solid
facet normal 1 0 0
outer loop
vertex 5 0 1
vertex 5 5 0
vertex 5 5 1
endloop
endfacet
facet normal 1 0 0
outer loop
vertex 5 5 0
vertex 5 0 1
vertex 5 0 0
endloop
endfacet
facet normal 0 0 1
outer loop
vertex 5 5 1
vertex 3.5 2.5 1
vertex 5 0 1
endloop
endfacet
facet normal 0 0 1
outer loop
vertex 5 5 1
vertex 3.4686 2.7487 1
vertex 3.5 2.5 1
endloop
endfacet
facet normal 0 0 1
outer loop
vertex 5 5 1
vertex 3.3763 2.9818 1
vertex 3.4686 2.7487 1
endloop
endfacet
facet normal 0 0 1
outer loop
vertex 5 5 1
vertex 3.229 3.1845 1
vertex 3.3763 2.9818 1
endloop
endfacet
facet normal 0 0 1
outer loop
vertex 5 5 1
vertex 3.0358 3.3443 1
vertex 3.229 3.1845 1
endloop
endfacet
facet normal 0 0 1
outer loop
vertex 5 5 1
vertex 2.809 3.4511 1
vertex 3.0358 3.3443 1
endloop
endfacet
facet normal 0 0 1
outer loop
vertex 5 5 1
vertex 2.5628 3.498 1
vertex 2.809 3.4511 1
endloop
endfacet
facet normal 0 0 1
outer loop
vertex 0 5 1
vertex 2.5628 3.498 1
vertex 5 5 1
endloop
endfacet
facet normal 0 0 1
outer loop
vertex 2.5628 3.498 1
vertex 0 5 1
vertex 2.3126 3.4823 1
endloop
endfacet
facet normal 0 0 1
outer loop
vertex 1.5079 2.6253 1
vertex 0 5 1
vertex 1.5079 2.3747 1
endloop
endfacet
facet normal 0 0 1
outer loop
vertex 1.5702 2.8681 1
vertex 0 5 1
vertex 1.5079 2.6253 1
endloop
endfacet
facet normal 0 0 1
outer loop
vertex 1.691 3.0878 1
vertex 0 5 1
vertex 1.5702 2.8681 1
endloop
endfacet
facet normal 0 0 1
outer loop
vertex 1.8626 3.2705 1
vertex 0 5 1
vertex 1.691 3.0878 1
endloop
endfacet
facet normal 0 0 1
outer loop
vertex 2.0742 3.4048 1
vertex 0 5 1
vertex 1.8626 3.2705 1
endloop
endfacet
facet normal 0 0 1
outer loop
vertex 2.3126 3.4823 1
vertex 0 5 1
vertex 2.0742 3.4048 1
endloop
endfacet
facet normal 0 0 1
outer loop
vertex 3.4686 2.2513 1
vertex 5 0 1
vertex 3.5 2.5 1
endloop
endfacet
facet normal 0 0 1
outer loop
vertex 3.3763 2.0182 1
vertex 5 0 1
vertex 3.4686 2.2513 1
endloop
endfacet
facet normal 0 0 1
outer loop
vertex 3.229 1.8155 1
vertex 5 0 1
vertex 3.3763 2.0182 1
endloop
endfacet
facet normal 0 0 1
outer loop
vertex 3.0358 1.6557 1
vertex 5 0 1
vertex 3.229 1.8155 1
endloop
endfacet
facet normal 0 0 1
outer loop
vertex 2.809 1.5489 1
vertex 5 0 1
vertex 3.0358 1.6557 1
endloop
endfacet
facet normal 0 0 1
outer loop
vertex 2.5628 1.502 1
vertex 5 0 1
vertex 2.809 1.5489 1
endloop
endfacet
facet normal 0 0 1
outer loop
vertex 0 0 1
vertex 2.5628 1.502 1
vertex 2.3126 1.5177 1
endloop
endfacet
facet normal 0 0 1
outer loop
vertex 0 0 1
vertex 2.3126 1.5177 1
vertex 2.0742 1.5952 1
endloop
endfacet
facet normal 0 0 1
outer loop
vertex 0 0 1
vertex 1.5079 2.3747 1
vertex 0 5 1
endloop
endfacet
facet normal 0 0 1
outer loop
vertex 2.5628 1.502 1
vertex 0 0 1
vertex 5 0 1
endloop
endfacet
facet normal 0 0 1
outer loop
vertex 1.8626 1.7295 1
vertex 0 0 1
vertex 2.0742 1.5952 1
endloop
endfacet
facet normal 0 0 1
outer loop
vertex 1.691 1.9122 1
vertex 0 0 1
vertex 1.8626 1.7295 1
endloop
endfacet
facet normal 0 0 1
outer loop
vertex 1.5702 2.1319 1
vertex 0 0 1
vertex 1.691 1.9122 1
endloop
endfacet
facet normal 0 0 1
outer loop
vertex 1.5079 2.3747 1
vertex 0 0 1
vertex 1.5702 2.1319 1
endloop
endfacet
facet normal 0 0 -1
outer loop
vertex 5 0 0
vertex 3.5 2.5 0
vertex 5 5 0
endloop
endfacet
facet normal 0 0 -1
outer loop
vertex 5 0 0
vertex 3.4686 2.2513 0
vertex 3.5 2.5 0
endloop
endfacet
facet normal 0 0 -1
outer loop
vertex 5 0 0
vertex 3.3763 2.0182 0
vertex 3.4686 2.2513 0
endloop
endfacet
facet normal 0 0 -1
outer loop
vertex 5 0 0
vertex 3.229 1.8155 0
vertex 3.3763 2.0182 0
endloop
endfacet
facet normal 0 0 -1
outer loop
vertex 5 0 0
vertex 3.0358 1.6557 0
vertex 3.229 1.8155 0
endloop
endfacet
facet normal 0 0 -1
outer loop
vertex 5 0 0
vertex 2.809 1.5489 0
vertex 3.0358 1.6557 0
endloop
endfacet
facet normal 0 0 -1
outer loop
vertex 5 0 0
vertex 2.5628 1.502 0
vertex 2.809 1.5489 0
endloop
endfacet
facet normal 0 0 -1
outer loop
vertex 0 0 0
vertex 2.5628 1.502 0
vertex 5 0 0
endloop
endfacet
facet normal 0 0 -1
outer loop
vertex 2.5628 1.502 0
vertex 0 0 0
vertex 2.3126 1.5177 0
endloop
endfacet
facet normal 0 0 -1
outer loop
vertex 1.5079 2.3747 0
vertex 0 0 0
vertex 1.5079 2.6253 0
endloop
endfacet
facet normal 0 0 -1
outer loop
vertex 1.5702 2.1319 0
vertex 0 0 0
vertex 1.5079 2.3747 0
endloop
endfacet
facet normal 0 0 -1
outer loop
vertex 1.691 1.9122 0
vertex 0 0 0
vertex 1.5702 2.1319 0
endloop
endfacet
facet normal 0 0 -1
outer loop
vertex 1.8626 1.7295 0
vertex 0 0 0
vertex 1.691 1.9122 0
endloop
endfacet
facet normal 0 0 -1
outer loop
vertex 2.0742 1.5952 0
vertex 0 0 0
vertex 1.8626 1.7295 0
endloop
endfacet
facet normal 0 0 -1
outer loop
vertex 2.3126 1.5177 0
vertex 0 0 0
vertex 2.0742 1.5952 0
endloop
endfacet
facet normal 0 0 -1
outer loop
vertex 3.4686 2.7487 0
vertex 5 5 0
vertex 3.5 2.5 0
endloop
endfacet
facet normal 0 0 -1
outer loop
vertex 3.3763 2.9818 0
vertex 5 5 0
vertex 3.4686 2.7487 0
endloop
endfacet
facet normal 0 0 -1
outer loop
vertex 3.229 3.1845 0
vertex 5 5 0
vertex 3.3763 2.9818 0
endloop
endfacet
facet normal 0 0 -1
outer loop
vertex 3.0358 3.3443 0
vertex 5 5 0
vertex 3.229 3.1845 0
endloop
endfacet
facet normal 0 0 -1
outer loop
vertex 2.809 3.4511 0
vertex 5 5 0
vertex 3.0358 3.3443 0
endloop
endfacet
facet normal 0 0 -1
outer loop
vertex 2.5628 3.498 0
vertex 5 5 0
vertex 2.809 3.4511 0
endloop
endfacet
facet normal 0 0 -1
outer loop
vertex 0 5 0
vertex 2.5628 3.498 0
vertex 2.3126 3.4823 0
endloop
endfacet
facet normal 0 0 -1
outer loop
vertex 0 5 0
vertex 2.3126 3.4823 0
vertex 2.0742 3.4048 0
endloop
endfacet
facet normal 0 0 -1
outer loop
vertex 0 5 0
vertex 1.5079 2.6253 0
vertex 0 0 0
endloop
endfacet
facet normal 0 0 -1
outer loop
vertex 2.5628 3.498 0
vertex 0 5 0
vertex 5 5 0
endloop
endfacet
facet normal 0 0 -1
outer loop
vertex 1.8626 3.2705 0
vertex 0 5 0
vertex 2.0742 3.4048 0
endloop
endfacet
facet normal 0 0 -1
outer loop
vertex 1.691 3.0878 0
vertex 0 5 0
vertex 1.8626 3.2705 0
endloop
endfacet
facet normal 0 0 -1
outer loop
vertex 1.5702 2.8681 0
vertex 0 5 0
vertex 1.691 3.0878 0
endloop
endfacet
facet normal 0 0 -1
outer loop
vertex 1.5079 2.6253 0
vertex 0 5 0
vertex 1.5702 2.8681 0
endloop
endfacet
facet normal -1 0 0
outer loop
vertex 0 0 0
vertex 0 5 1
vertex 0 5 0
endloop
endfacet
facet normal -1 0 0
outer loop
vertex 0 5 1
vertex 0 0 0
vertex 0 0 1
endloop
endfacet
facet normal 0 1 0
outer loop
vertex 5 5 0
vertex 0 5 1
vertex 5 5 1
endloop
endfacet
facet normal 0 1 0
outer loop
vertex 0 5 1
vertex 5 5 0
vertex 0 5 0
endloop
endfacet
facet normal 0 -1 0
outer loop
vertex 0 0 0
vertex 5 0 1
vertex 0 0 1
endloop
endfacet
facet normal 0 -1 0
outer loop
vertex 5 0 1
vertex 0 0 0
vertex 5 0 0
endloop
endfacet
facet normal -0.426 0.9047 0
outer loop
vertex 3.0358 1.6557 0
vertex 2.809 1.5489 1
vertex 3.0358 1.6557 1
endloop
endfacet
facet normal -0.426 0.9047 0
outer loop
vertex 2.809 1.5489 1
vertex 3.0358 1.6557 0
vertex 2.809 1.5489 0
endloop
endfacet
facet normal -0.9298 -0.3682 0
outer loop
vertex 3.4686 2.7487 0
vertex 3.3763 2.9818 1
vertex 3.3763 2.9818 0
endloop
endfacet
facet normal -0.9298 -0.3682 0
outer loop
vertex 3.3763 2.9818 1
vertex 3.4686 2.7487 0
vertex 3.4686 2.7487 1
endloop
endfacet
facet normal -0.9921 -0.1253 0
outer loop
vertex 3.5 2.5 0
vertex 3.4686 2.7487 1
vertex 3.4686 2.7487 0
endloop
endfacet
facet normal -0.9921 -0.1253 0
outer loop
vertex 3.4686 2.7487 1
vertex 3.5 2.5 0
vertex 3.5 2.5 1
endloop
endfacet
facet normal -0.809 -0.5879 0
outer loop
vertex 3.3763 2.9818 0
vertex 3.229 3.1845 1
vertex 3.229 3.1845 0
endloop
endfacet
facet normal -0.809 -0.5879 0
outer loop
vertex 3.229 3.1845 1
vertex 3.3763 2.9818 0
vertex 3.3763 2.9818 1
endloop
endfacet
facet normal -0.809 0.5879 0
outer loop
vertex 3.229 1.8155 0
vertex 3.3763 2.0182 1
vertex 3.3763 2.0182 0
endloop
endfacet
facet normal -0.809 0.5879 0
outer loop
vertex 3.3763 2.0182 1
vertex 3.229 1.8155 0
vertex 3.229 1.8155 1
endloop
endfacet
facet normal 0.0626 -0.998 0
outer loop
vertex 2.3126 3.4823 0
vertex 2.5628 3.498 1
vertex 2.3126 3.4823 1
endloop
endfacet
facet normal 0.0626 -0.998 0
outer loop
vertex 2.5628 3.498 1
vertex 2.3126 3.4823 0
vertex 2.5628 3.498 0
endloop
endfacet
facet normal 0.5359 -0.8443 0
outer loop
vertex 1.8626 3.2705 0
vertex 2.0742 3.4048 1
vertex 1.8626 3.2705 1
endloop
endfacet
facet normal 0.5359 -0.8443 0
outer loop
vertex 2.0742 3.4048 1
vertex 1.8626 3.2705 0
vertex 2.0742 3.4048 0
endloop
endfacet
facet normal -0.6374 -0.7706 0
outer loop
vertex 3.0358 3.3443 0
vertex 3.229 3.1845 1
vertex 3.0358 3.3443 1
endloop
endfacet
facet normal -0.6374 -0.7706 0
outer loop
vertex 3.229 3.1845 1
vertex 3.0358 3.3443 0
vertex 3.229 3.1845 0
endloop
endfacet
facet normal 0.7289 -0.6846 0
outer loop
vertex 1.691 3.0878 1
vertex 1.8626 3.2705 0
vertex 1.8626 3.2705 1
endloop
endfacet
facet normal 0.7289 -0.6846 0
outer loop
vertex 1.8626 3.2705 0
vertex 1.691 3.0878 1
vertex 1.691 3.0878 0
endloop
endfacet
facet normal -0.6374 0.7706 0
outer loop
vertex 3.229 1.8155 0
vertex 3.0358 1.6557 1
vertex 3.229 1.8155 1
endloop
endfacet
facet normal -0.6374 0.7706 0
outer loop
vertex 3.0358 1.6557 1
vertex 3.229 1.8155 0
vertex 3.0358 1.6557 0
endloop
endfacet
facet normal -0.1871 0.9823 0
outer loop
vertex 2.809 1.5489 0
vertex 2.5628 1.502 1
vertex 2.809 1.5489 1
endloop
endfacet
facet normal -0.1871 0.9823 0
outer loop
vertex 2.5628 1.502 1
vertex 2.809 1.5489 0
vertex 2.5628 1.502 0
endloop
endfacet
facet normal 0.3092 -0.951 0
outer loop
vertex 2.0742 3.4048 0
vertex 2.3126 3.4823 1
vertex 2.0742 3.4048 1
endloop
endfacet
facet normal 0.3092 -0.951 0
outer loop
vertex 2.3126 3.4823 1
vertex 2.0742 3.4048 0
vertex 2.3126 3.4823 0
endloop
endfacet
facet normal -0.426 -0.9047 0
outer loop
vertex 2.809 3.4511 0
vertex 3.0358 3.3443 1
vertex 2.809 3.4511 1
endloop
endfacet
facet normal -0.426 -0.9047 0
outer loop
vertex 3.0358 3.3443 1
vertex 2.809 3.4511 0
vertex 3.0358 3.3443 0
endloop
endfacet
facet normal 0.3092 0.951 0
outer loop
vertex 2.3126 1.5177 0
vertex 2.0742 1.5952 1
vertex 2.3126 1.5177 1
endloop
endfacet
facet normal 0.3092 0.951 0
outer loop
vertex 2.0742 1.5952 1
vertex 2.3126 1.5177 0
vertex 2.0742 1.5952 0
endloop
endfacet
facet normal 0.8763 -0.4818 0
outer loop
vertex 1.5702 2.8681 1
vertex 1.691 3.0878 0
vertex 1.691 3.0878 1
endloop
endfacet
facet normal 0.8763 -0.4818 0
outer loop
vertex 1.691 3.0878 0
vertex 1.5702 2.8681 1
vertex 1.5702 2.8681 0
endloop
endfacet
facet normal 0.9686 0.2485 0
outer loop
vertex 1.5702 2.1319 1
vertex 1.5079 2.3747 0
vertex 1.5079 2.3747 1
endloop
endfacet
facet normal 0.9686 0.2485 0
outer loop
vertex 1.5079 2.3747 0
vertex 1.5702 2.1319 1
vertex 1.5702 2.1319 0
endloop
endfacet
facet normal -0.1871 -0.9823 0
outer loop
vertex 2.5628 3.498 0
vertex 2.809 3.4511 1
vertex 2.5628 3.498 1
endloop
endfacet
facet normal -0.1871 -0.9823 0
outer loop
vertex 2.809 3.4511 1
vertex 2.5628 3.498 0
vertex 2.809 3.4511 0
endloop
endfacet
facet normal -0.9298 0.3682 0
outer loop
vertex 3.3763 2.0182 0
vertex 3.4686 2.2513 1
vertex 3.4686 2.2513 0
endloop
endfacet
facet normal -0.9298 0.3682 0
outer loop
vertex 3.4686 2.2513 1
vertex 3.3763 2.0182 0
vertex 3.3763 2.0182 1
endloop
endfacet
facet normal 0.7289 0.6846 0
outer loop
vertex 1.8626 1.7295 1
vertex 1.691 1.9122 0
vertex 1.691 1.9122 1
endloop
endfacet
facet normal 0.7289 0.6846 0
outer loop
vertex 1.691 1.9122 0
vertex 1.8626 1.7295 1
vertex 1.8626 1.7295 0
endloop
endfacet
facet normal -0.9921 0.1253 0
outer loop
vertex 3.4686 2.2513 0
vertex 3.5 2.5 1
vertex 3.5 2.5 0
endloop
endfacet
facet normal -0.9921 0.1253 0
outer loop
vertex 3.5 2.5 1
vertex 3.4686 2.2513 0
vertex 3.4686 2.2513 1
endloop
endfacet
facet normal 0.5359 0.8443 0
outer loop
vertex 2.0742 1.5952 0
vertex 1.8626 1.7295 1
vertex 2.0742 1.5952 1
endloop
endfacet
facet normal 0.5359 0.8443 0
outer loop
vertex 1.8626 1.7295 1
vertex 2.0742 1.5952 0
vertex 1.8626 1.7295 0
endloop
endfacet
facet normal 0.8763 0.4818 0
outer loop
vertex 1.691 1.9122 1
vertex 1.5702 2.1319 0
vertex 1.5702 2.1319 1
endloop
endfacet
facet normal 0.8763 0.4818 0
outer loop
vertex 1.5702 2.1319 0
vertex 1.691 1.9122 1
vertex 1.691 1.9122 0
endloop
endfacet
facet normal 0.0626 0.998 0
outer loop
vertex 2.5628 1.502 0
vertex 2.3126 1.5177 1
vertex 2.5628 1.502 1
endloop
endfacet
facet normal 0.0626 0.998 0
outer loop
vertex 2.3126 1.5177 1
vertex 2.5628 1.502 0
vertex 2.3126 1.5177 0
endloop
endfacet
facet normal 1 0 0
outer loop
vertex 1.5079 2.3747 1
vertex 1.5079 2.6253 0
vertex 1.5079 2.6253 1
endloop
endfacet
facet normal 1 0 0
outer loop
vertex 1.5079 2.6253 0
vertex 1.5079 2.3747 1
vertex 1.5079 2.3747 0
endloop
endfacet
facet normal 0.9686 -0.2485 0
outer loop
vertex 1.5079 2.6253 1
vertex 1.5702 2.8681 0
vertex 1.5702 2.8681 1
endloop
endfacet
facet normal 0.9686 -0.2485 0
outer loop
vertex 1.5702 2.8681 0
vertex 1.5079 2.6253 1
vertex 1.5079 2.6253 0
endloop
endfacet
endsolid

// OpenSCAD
//facets
$fn=25;
//cube

difference(){cube([5,5,1]);
//cylinder for hole
translate([2.5, 2.5, 0]) cylinder(r1=1,r2=1,3);}

// Use exclamation (!) to only show the thing with the !.
//Use % to make translucent
//Use # to make red
